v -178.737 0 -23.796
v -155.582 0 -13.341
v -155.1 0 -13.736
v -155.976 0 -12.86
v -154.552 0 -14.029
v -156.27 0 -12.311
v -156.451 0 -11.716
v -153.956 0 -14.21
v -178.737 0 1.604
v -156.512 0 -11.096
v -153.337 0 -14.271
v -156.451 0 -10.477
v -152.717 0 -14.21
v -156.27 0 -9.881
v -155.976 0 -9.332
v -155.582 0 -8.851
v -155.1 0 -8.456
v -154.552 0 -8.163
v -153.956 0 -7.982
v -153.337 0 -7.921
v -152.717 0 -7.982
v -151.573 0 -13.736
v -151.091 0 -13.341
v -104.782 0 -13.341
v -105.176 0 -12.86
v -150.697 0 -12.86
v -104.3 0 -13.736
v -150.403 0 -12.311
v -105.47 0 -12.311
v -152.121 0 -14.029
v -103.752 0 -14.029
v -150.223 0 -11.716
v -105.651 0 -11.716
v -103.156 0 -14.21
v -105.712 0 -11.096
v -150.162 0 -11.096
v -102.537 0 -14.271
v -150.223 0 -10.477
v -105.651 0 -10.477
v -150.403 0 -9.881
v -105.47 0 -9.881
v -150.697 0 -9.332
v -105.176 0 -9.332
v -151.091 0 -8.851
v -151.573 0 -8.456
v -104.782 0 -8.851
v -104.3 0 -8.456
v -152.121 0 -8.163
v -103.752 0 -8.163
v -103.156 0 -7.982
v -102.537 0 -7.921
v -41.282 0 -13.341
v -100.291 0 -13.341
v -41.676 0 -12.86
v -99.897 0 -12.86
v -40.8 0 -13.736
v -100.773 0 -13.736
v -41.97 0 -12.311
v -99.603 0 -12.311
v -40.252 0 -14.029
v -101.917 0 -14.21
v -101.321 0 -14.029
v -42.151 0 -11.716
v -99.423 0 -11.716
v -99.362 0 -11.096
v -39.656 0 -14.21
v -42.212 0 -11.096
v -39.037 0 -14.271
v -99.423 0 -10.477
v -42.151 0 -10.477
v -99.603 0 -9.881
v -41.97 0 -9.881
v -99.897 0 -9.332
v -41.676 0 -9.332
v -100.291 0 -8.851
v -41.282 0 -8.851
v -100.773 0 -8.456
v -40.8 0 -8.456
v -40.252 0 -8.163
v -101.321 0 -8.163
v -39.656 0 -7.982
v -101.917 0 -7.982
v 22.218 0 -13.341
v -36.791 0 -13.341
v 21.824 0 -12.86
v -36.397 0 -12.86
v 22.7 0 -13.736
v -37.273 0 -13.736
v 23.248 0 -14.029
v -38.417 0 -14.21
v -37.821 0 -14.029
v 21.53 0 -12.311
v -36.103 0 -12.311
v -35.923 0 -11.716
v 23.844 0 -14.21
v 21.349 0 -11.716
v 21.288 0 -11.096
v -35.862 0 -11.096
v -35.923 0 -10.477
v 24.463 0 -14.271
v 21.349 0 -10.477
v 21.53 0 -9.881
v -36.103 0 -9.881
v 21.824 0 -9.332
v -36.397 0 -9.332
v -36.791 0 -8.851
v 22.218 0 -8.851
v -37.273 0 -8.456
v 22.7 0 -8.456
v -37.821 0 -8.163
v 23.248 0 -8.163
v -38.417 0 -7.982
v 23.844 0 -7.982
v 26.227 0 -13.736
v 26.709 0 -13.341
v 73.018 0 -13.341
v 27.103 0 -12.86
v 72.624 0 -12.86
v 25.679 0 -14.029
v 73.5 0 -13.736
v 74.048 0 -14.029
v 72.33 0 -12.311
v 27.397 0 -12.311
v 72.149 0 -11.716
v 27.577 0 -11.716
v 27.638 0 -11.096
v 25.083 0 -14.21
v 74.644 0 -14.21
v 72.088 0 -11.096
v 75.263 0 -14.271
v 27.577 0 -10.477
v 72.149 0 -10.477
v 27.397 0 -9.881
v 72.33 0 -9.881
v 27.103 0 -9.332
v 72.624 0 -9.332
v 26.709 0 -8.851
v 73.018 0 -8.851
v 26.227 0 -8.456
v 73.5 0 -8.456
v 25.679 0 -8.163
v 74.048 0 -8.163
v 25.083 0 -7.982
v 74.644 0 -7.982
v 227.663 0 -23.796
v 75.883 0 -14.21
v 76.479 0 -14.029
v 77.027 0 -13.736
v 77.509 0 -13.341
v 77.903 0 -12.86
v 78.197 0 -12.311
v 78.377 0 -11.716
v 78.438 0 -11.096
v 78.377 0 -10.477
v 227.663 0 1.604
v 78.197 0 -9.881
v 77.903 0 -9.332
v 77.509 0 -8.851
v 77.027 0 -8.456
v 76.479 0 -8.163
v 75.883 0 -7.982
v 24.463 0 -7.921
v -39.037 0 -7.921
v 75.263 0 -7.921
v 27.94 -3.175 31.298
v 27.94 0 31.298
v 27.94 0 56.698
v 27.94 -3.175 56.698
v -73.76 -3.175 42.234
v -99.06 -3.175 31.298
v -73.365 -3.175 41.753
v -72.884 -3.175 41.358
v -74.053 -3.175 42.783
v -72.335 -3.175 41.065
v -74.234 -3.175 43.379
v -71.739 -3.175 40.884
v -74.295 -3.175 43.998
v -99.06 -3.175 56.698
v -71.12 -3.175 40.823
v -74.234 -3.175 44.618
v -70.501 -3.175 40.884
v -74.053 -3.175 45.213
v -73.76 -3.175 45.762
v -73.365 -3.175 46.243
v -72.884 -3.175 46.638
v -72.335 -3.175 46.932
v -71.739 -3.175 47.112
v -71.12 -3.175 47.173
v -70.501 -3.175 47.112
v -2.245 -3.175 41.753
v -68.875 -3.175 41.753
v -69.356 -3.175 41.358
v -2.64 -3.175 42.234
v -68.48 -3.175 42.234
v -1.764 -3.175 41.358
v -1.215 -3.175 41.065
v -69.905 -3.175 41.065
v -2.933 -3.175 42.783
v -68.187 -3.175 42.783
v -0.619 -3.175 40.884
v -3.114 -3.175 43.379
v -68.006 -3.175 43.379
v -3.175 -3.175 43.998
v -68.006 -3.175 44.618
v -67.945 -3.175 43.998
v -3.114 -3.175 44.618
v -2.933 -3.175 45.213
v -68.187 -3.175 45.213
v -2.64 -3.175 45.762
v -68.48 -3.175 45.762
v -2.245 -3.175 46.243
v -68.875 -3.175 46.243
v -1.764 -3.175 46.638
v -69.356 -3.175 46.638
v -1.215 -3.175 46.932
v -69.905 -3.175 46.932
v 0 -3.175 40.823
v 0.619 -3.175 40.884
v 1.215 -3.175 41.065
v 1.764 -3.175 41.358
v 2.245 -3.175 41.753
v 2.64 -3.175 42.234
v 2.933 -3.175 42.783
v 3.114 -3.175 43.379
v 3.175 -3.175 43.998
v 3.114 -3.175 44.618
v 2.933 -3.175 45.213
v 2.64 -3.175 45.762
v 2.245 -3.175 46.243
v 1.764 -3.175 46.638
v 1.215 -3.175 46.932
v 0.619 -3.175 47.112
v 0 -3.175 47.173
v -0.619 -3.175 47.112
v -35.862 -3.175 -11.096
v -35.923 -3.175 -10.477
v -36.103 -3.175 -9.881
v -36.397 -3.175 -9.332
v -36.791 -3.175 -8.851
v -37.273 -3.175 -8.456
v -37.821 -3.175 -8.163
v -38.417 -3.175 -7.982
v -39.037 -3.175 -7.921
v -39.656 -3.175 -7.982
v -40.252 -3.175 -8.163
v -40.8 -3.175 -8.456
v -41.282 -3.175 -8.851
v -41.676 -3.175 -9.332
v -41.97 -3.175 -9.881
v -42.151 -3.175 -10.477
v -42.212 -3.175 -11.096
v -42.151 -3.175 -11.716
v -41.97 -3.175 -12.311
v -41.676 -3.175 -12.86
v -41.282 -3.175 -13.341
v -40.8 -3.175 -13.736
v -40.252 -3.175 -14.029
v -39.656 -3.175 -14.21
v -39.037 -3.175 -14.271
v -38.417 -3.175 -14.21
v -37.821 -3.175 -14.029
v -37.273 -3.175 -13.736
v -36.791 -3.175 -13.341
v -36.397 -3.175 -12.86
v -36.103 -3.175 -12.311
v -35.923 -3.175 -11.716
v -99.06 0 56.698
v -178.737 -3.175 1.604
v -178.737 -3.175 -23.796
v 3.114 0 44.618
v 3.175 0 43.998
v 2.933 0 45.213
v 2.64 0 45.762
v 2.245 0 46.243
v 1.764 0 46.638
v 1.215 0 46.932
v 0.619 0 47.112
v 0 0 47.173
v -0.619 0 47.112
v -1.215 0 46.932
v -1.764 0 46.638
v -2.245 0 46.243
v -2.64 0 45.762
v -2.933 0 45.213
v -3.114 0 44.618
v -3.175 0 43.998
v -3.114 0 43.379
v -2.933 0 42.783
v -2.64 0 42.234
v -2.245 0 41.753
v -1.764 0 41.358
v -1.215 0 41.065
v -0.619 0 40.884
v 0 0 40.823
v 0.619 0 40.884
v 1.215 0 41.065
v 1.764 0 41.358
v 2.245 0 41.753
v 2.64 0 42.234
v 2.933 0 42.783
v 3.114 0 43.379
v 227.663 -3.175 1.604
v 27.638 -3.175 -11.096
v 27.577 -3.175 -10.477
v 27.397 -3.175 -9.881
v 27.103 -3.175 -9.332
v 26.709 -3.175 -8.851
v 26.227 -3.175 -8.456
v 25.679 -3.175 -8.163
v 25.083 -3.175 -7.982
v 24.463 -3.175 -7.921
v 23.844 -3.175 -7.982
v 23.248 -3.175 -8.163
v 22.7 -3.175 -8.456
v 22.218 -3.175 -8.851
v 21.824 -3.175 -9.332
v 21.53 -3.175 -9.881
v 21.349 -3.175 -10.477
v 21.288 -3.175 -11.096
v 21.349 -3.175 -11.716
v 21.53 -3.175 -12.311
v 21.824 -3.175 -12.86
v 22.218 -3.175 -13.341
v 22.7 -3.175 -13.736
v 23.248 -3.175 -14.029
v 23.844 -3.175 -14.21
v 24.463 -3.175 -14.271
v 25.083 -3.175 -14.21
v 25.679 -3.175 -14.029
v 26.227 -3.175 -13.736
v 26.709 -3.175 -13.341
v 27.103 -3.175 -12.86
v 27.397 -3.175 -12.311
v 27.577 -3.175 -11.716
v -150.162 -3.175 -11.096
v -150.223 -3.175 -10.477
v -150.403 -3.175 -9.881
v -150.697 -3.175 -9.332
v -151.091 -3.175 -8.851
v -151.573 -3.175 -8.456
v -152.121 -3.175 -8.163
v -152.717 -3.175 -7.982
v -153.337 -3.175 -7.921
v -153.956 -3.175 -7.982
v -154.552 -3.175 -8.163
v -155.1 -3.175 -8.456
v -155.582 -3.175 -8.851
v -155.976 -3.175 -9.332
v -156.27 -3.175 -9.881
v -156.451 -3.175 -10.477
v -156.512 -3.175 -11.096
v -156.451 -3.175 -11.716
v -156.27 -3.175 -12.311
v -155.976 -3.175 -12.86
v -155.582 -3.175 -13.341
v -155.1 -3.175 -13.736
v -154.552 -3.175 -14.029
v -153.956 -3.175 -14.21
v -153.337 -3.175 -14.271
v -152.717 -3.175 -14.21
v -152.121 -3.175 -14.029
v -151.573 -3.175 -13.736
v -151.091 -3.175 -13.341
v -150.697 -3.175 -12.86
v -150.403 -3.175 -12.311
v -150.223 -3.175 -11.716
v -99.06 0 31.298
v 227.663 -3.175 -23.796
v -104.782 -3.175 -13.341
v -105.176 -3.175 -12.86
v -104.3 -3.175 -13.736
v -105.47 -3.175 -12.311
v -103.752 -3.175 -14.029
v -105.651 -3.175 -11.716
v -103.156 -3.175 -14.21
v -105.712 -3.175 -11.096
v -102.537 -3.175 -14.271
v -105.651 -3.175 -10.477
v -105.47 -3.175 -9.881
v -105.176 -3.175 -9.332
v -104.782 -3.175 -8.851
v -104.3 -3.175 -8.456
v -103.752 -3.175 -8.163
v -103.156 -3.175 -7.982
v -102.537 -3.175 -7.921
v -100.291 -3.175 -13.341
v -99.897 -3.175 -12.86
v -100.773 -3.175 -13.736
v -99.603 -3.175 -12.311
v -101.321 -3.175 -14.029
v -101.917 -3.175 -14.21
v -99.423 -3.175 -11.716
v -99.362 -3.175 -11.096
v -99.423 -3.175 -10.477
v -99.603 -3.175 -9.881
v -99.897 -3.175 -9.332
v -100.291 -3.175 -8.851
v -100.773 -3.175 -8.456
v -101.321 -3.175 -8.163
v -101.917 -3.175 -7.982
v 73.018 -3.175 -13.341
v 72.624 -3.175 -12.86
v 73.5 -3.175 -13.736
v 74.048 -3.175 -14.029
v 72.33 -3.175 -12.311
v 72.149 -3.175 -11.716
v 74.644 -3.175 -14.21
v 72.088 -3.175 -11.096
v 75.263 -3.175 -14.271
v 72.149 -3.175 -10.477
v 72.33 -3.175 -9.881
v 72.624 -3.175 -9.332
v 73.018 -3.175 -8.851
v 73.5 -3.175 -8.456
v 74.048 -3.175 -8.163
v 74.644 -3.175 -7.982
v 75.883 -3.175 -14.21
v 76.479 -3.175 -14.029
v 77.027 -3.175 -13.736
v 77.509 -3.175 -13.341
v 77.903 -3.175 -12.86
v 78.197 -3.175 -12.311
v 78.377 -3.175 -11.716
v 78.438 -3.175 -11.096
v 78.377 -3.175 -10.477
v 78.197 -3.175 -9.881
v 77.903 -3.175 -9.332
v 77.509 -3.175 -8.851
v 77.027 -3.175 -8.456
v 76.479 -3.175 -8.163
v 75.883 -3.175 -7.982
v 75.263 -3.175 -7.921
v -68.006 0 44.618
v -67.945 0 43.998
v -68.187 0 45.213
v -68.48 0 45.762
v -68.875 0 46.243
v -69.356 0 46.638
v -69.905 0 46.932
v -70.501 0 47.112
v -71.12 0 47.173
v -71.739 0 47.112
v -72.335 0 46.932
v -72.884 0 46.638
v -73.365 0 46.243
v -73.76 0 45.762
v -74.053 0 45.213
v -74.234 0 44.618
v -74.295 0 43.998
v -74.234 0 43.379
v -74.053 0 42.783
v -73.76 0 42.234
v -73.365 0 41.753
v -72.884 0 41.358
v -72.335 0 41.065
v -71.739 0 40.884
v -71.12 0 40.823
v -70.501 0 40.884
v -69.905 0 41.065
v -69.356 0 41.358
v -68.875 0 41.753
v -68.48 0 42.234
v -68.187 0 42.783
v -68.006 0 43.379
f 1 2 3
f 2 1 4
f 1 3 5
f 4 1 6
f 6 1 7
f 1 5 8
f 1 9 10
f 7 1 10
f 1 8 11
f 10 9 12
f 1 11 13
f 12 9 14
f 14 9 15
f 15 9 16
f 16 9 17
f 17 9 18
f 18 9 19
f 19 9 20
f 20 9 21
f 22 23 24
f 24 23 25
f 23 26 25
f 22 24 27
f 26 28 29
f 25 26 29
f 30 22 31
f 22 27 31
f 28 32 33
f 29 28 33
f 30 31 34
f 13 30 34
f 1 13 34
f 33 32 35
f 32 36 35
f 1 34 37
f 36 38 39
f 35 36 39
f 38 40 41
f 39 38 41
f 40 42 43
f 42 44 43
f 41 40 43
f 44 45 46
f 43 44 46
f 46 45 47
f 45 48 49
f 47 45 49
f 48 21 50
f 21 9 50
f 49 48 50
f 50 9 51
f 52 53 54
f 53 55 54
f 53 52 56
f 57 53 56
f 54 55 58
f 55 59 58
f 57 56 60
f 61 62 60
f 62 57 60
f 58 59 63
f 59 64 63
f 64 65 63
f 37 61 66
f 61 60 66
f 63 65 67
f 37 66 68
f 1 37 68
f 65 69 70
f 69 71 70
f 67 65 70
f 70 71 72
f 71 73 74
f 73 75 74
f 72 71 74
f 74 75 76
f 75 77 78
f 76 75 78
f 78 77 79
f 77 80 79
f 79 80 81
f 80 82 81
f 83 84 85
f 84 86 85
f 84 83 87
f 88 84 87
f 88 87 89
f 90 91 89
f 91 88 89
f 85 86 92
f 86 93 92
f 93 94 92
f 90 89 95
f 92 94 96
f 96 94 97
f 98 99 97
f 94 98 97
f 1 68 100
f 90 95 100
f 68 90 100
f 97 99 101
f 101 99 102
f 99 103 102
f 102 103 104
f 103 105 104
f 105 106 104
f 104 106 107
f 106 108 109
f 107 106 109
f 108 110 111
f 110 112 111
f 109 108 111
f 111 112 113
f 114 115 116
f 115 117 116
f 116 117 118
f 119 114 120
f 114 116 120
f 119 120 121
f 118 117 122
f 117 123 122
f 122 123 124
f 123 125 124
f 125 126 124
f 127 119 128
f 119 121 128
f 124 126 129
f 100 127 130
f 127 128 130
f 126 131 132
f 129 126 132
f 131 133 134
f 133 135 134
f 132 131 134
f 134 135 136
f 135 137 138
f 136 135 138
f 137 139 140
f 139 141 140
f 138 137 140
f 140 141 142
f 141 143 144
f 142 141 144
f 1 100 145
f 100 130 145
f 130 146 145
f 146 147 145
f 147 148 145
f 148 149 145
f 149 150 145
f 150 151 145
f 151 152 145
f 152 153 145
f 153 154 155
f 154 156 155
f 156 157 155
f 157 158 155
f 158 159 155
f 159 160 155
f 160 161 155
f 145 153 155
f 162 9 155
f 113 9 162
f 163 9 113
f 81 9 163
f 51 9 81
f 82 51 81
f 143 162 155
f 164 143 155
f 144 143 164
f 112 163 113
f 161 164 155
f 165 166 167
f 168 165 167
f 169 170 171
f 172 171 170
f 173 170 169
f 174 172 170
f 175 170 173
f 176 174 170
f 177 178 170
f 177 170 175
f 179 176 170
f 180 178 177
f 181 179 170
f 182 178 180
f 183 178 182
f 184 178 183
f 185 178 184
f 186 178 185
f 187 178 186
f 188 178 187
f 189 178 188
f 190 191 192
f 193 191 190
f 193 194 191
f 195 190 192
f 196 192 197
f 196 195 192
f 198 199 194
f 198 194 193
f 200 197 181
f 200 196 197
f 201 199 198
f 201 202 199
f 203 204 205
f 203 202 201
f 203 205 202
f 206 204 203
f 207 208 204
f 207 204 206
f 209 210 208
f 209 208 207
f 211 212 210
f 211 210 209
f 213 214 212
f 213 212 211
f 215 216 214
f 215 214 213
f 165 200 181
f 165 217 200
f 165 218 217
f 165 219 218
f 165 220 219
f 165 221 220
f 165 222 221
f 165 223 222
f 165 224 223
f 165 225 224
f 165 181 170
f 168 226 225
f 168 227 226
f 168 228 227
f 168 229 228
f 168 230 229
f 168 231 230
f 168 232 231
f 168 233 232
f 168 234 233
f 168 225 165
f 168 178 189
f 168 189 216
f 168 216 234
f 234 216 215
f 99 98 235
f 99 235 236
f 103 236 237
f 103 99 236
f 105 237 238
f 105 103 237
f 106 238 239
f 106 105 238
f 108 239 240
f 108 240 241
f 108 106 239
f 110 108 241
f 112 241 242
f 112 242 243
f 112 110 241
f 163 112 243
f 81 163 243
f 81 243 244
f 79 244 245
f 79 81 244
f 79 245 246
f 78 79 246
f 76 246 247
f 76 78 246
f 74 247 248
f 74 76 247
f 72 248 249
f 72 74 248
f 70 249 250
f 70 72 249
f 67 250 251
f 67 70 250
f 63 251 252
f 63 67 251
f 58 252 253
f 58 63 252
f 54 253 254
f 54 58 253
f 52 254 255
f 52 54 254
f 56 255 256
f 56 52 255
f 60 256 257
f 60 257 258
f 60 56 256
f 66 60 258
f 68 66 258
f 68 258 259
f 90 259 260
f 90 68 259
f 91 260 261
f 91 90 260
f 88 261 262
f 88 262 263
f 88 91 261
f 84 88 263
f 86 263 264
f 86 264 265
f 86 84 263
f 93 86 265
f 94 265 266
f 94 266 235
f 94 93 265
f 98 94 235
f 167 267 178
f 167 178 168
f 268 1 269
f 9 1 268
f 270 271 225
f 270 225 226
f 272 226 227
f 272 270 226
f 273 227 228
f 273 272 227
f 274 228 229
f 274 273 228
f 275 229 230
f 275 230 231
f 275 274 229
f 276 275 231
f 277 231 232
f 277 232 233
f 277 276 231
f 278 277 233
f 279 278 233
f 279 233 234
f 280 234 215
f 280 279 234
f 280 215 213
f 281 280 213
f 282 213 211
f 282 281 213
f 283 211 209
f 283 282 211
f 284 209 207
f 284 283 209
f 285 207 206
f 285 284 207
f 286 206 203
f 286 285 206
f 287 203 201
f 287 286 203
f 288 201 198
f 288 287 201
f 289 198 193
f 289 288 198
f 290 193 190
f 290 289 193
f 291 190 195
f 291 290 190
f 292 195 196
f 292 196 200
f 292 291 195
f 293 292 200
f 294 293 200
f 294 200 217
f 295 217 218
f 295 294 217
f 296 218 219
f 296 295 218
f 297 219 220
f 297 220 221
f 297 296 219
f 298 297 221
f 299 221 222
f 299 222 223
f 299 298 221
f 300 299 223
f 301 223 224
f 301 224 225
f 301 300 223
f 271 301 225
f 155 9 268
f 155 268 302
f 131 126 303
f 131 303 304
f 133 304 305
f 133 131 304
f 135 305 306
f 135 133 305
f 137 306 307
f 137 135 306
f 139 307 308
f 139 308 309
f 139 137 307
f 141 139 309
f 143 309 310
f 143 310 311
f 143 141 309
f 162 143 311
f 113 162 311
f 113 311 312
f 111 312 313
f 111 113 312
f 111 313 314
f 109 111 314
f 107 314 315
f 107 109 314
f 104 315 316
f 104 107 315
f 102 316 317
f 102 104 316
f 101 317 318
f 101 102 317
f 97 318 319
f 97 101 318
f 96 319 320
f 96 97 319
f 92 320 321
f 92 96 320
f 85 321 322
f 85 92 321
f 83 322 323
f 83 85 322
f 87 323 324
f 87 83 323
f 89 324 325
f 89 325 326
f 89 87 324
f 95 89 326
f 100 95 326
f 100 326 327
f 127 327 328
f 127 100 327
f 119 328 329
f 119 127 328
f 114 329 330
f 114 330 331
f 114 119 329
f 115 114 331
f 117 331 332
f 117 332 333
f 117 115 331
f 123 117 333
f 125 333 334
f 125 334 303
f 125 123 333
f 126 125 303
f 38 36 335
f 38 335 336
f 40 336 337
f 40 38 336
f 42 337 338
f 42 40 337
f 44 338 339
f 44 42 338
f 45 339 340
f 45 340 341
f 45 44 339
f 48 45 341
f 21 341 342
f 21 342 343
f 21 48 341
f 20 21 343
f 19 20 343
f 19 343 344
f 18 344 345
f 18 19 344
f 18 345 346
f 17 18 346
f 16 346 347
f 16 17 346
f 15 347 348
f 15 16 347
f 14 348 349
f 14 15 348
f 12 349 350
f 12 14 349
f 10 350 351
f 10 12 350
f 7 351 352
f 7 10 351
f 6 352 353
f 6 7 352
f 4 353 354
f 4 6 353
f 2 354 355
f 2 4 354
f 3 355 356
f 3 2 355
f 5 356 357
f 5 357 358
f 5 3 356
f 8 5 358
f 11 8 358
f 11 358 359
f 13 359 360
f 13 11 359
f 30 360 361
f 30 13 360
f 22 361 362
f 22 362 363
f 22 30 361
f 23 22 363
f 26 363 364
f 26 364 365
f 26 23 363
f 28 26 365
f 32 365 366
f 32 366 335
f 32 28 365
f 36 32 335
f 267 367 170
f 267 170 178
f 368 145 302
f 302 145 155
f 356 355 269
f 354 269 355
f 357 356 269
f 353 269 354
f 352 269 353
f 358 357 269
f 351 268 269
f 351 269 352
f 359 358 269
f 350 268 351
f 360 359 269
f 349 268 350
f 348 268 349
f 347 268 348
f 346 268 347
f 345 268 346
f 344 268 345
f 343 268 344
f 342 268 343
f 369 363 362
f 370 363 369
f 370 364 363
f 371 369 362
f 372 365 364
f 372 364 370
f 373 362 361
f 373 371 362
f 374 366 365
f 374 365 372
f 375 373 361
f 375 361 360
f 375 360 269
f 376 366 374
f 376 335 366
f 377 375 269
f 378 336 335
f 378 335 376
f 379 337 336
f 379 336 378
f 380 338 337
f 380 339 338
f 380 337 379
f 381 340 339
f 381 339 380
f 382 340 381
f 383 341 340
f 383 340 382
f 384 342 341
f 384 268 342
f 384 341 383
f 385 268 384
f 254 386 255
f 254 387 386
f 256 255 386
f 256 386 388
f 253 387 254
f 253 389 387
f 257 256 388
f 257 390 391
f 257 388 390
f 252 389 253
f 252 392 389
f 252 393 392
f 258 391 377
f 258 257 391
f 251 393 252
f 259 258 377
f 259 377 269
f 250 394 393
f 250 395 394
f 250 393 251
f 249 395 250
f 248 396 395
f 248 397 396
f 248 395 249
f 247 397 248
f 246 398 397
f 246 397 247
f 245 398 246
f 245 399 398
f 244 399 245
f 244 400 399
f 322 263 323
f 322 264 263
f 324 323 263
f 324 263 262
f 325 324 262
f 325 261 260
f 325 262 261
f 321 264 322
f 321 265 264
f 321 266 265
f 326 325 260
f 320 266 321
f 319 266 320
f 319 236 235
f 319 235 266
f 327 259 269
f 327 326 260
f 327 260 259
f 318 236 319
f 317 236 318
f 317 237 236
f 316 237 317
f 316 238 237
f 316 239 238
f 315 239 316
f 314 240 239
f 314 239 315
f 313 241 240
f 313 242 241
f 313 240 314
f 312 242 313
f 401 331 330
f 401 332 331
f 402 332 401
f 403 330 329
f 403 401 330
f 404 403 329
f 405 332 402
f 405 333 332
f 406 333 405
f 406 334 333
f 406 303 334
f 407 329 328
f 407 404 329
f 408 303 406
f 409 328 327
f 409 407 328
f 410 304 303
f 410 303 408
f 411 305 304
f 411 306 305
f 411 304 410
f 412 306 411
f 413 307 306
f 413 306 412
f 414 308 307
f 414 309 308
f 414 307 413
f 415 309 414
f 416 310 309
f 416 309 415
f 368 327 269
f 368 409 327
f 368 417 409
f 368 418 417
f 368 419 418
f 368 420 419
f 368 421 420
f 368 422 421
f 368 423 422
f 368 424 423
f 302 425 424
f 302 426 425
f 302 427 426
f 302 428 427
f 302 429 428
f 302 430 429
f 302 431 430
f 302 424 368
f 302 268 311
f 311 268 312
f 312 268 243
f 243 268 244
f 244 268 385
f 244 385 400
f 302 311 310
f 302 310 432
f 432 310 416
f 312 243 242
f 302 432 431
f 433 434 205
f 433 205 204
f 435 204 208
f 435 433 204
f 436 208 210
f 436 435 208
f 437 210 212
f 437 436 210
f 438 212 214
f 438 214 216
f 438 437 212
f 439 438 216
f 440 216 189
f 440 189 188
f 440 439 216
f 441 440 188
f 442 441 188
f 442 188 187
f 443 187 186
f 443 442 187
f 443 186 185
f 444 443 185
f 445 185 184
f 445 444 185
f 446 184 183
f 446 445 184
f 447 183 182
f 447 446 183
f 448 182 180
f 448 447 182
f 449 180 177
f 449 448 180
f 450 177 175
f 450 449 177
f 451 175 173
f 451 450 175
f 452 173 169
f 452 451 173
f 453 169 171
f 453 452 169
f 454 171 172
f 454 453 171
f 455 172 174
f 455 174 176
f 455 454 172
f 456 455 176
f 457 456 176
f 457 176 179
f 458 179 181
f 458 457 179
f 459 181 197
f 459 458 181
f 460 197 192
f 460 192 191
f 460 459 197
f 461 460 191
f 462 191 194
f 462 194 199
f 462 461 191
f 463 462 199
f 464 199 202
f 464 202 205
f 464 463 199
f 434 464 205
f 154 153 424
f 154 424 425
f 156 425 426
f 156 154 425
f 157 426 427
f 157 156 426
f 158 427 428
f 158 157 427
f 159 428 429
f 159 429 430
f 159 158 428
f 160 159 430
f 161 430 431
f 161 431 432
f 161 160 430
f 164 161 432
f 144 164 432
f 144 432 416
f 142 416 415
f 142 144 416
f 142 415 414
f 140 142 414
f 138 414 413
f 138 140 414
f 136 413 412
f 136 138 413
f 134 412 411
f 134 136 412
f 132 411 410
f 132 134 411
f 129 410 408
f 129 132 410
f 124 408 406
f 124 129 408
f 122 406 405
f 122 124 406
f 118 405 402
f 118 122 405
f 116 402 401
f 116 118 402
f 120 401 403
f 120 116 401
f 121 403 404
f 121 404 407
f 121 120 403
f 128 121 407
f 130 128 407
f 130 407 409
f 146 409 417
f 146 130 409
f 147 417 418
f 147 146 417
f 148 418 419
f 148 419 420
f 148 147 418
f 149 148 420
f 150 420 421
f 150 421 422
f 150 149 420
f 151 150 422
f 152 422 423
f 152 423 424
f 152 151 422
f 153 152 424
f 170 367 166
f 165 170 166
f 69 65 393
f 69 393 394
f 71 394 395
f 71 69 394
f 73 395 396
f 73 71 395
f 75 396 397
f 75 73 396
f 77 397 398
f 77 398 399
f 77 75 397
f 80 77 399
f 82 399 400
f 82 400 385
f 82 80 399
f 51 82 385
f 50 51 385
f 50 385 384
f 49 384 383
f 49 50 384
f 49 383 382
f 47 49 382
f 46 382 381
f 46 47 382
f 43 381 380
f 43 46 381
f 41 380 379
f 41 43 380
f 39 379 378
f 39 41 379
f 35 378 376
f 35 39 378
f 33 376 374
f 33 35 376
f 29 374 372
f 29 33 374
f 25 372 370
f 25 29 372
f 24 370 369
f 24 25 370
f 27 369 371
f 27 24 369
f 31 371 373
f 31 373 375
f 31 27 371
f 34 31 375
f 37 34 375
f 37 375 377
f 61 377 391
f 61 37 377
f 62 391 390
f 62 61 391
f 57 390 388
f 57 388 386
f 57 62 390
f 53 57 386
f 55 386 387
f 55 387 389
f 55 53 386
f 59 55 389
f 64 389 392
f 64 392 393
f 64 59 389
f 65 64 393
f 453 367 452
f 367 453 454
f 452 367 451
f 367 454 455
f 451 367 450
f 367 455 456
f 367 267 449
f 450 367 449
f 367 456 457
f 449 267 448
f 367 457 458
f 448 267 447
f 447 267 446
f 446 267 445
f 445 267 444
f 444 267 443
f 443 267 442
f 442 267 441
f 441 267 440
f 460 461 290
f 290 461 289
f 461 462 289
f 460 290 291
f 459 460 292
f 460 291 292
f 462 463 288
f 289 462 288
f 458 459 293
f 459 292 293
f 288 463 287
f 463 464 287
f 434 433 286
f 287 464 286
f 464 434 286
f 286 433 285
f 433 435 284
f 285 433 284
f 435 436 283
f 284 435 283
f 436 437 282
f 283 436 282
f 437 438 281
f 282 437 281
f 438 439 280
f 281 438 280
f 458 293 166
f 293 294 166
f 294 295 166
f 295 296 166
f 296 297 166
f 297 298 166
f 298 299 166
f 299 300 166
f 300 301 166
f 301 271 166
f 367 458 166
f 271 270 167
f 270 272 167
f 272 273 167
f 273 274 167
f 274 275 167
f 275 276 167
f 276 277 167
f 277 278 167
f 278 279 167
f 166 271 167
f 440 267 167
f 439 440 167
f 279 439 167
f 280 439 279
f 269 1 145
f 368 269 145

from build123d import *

# Parameters (mm, degrees)
F0_W     = 406.4
F0_H     = 25.4
F0_R     = 3.175
F1_DEPTH = 3.175
F2_W     = 127
F2_H     = 25.4
F2_R     = 3.175
F3_DEPTH = 3.175


# Not quite as in the source:
# - a length typed as a fraction of an inch, garbled in the dataset ("3 / 203.2 mm" for 3/8 in), is restored


with BuildPart() as f1:
    # F0 (on Front) → F1 (new body)
    with BuildSketch(Plane.XZ):
        with Locations((24.4634822011, -11.0960994189)):
            Rectangle(F0_W, F0_H)
        with Locations((-153.3365177989, -11.0960994189)):
            Circle(F0_R, mode=Mode.SUBTRACT)
        with Locations((-102.5365177989, -11.0960994189)):
            Circle(F0_R, mode=Mode.SUBTRACT)
        with Locations((-39.0365177989, -11.0960994189)):
            Circle(F0_R, mode=Mode.SUBTRACT)
        with Locations((24.4634822011, -11.0960994189)):
            Circle(F0_R, mode=Mode.SUBTRACT)
        with Locations((75.2634822011, -11.0960994189)):
            Circle(F0_R, mode=Mode.SUBTRACT)
    extrude(amount=F1_DEPTH)


with BuildPart() as f3:
    # F2 (on Front) → F3 (new body)
    with BuildSketch(Plane.XZ):
        with Locations((-35.56, 43.9982284964)):
            Rectangle(F2_W, F2_H)
        with Locations((-71.12, 43.9982284964)):
            Circle(F2_R, mode=Mode.SUBTRACT)
        with Locations((0, 43.9982284964)):
            Circle(F2_R, mode=Mode.SUBTRACT)
    extrude(amount=F3_DEPTH)


solid = Compound([f1.part, f3.part])
